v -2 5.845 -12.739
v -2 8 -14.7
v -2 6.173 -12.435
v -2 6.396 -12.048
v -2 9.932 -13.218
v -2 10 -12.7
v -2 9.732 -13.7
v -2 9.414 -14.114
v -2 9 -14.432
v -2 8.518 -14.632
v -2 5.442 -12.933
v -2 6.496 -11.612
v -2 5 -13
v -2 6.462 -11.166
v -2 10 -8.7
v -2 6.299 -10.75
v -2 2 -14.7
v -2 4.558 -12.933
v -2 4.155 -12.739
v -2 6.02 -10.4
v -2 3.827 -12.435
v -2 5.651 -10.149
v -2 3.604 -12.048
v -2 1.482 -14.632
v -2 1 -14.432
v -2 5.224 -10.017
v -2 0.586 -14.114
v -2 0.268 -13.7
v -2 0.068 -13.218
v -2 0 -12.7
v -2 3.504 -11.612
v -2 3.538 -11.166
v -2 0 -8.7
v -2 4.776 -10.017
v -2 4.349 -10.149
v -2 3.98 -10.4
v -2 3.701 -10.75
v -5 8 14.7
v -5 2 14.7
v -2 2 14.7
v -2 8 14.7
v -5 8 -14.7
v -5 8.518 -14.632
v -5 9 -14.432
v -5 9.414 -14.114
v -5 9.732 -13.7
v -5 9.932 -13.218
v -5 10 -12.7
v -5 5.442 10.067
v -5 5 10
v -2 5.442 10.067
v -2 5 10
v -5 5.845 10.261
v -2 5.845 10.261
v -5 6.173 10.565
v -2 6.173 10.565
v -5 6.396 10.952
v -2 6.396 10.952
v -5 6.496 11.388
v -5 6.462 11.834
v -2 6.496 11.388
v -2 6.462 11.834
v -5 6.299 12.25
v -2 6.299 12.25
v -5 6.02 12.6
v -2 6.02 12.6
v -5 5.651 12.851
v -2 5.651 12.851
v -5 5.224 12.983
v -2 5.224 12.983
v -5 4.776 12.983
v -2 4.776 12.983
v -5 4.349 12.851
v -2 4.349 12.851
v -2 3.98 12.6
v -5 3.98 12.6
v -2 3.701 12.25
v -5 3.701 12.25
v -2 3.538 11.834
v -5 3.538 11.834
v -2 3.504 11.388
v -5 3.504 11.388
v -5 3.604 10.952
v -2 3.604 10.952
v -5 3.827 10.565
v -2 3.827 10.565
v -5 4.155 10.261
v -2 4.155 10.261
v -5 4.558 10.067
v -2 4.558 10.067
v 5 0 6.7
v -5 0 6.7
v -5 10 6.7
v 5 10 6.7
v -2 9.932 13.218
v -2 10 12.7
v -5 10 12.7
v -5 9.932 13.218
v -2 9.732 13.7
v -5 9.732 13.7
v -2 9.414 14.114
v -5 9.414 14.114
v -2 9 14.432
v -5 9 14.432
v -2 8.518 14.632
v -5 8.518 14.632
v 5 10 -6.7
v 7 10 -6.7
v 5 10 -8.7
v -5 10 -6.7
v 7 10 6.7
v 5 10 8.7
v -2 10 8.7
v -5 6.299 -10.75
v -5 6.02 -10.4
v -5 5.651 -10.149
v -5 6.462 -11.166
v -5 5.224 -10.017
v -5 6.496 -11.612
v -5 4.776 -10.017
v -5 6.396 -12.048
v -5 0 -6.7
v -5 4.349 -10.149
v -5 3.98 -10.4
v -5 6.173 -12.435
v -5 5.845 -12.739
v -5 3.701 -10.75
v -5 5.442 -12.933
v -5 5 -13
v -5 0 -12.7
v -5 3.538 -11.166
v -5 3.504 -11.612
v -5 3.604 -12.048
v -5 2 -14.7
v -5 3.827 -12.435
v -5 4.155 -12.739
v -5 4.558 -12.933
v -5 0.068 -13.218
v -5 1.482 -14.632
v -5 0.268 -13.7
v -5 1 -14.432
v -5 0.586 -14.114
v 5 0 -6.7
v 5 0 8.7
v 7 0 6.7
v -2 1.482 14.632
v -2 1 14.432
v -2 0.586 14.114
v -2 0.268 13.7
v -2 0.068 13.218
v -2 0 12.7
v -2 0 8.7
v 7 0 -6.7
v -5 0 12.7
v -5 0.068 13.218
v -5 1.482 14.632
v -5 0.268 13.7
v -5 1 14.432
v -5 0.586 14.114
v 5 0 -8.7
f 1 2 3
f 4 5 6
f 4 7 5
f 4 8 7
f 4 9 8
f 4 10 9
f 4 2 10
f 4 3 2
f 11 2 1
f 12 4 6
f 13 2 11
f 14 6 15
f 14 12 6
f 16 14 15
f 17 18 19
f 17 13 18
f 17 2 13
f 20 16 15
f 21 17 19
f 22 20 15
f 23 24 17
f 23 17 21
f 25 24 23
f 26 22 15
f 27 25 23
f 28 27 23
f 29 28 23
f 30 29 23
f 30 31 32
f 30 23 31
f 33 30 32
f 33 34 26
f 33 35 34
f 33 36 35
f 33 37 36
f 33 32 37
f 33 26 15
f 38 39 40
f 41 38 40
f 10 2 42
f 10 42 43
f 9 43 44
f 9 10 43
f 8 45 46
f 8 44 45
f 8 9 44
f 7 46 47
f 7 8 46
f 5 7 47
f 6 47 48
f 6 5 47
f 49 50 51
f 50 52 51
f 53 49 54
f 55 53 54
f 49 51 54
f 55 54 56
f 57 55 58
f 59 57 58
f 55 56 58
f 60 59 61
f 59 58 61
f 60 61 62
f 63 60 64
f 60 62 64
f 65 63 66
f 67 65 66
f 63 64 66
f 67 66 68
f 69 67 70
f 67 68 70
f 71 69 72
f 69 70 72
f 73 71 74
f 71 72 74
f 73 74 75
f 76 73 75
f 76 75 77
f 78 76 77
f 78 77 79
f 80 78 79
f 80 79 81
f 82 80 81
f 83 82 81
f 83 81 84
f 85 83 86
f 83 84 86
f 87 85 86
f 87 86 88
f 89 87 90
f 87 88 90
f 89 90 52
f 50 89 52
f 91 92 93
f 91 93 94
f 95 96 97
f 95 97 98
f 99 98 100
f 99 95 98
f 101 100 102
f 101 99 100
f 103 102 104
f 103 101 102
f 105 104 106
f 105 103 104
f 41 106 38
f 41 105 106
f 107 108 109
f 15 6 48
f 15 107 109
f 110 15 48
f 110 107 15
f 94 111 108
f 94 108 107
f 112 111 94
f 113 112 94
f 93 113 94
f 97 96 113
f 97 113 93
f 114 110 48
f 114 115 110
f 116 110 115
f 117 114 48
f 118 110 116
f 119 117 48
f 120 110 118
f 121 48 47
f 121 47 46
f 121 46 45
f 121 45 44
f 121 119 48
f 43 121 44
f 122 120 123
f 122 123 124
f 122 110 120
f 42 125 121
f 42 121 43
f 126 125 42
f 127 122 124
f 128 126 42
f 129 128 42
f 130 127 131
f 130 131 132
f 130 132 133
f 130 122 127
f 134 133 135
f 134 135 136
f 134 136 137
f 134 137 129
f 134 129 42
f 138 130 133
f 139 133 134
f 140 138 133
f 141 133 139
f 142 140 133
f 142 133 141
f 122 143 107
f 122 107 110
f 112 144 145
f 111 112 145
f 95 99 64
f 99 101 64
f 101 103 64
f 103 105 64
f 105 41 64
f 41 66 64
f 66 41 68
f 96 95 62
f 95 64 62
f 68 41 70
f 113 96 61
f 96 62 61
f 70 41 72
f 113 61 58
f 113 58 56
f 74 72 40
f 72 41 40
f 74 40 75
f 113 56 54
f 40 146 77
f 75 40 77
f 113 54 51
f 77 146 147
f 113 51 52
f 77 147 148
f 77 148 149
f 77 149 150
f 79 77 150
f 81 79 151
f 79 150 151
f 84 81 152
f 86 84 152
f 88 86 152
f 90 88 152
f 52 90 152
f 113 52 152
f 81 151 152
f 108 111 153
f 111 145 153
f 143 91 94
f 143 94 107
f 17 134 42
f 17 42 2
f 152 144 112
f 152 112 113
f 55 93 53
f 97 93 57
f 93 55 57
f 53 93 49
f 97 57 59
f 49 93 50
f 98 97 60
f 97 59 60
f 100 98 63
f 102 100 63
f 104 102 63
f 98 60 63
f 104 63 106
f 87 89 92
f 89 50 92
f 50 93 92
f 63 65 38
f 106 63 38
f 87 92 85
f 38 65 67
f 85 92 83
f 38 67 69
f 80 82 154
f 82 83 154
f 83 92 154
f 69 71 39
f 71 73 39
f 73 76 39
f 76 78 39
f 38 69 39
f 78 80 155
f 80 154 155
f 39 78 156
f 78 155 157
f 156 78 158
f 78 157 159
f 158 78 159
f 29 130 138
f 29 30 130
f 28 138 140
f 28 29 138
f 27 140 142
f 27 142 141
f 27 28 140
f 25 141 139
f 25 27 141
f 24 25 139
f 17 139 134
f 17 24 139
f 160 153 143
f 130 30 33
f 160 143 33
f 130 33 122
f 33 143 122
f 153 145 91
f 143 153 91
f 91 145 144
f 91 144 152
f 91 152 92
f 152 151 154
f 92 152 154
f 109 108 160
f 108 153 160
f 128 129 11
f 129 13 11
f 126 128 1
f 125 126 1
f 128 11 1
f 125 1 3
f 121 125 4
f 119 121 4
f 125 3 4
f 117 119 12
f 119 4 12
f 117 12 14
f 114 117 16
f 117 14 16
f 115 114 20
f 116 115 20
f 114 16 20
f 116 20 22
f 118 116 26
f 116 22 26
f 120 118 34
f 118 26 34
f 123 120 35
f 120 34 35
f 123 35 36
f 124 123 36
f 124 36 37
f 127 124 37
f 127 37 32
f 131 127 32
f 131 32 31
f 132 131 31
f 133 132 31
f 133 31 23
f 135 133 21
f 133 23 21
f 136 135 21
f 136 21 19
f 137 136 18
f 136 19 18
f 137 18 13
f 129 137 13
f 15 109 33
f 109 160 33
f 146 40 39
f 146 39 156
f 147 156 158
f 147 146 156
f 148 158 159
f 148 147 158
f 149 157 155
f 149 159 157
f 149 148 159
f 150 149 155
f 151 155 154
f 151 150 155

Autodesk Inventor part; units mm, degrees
ref_plane "YZ Plane" through (0, 0, 0) normal (1, 0, 0) x (0, 1, 0)
ref_plane "XZ Plane" through (0, 0, 0) normal (0, 1, 0) x (-1, 0, 0)
ref_plane "XY Plane" through (0, 0, 0) normal (0, 0, 1) x (1, 0, 0)
sketch "Szkic1" plane through (0, 0, 0) normal (0, 1, 0) x (-1, 0, 0)
  line L0 (-4, 6.5) -> (4, 6.5) construction
  line L1 (4, 6.5) -> (4, -6.5) construction
  line L2 (4, -6.5) -> (-4, -6.5) construction
  line L3 (-4, -6.5) -> (-4, 6.5) construction
  line L4 (-4, 6.5) -> (4, -6.5) construction
  line L5 (4, 6.5) -> (-4, -6.5) construction
  line L6 (-5, -6.7) -> (5, -6.7)
  line L7 (5, -6.7) -> (5, 6.7)
  line L8 (5, 6.7) -> (-5, 6.7)
  line L9 (-5, 6.7) -> (-5, -6.7)
  line L10 (-5, -6.7) -> (5, 6.7) construction
  line L11 (5, -6.7) -> (-5, 6.7) construction
  line L12 (5, 6.7) -> (5, 11.7)
  line L13 (5, -6.7) -> (5, -11.7)
  line L14 (5, 11.7) -> (5, 14.7)
  line L15 (5, -11.7) -> (5, -14.7)
  line L16 (5, 14.7) -> (2, 14.7)
  line L17 (2, 14.7) -> (2, 11.7)
  line L18 (2, 11.7) -> (5, 11.7)
  line L19 (5, 11.7) -> (5, 14.7)
  line L20 (5, -14.7) -> (2, -14.7)
  line L21 (2, -14.7) -> (2, -11.7)
  line L22 (2, -11.7) -> (5, -11.7)
  line L23 (5, -11.7) -> (5, -14.7)
  line L24 (-5, 0) -> (-7, 0)
  line L25 (-5, 6.7) -> (-7, 6.7)
  line L26 (-5, -6.7) -> (-7, -6.7)
  line L27 (2, 11.7) -> (2, 8.7)
  line L28 (-7, 6.7) -> (-7, 0)
  line L29 (-7, 0) -> (-7, -6.7)
  line L30 (2, -11.7) -> (2, -8.7)
  line L31 (-5, 6.7) -> (-5, 8.7)
  line L32 (-5, 8.7) -> (2, 8.7)
  line L33 (-5, -6.7) -> (-5, -8.7)
  line L34 (-5, -8.7) -> (2, -8.7)
  line L35 (-5, 8.7) -> (-7, 6.7)
  line L36 (-7, -6.7) -> (-5, -8.7)
  point P0 (0, 0)
  dimension "d0" = 8
  dimension "d1" = 13
  dimension "d2" = 10
  dimension "d3" = 13.4
  dimension "d4" = 5
  dimension "d5" = 5
  dimension "d6" = 3
  dimension "d7" = 3
  dimension "d8" = 3
  dimension "d9" = 3
  dimension "d10" = 2
  dimension "d11" = 2
  dimension "d12" = 2
  dimension "d13" = 3
  dimension "d14" = 3
  dimension "d15" = 2
  dimension "d16" = 2
extrude "Wyciągnięcie proste1" add sketch "Szkic1" along normal blind 10 contours L26 L29 L24 L9 | L33 L36 L26 | L6 L13 L22 L30 L34 L33 | L24 L28 L25 L9 | L8 L31 L32 L27 L18 L12 | L15 L20 L21 L22 | L25 L35 L31 | L18 L17 L16 L14
sketch "Szkic2" plane through (-2, 0, 14.7) normal (1, 0, 0) x (0, 0, -1)
  line L0 (0, 10) -> (6, 10) construction
  line L1 (6, 0) -> (6, 10) construction
  line L2 (0, 0) -> (0, 10) construction
  line L3 (6, 0) -> (0, 0) construction
  line L4 (14.7, 0) -> (14.7, 10) construction
  line L5 (8, 10) -> (21.4, 10) construction
  circle A0 centre (3.2, 5) radius 1.5
  circle A1 centre (26.2, 5) radius 1.5
  line L6 (23.4, 0) -> (23.4, 10) projected
  line L7 (0, 0) -> (6, 10) construction
  line L8 (6, 0) -> (0, 10) construction
  line L9 (6, 0) -> (6, 10) projected
  point P0 (6, 5)
  point P1 (6, 5)
  dimension "d19" = 3
  dimension "d27" = 2.8
  dimension "d28" = 5
extrude "Wyciągnięcie proste2" cut sketch "Szkic2" against normal blind 6.65
fillet "Zaokrąglenie1" radius 2 4 edges at (-3.5, 10, 14.7) (-3.5, 0, 14.7) (-3.5, 10, -14.7) (-3.5, 0, -14.7)
properties part number "silnik_lockedin"
